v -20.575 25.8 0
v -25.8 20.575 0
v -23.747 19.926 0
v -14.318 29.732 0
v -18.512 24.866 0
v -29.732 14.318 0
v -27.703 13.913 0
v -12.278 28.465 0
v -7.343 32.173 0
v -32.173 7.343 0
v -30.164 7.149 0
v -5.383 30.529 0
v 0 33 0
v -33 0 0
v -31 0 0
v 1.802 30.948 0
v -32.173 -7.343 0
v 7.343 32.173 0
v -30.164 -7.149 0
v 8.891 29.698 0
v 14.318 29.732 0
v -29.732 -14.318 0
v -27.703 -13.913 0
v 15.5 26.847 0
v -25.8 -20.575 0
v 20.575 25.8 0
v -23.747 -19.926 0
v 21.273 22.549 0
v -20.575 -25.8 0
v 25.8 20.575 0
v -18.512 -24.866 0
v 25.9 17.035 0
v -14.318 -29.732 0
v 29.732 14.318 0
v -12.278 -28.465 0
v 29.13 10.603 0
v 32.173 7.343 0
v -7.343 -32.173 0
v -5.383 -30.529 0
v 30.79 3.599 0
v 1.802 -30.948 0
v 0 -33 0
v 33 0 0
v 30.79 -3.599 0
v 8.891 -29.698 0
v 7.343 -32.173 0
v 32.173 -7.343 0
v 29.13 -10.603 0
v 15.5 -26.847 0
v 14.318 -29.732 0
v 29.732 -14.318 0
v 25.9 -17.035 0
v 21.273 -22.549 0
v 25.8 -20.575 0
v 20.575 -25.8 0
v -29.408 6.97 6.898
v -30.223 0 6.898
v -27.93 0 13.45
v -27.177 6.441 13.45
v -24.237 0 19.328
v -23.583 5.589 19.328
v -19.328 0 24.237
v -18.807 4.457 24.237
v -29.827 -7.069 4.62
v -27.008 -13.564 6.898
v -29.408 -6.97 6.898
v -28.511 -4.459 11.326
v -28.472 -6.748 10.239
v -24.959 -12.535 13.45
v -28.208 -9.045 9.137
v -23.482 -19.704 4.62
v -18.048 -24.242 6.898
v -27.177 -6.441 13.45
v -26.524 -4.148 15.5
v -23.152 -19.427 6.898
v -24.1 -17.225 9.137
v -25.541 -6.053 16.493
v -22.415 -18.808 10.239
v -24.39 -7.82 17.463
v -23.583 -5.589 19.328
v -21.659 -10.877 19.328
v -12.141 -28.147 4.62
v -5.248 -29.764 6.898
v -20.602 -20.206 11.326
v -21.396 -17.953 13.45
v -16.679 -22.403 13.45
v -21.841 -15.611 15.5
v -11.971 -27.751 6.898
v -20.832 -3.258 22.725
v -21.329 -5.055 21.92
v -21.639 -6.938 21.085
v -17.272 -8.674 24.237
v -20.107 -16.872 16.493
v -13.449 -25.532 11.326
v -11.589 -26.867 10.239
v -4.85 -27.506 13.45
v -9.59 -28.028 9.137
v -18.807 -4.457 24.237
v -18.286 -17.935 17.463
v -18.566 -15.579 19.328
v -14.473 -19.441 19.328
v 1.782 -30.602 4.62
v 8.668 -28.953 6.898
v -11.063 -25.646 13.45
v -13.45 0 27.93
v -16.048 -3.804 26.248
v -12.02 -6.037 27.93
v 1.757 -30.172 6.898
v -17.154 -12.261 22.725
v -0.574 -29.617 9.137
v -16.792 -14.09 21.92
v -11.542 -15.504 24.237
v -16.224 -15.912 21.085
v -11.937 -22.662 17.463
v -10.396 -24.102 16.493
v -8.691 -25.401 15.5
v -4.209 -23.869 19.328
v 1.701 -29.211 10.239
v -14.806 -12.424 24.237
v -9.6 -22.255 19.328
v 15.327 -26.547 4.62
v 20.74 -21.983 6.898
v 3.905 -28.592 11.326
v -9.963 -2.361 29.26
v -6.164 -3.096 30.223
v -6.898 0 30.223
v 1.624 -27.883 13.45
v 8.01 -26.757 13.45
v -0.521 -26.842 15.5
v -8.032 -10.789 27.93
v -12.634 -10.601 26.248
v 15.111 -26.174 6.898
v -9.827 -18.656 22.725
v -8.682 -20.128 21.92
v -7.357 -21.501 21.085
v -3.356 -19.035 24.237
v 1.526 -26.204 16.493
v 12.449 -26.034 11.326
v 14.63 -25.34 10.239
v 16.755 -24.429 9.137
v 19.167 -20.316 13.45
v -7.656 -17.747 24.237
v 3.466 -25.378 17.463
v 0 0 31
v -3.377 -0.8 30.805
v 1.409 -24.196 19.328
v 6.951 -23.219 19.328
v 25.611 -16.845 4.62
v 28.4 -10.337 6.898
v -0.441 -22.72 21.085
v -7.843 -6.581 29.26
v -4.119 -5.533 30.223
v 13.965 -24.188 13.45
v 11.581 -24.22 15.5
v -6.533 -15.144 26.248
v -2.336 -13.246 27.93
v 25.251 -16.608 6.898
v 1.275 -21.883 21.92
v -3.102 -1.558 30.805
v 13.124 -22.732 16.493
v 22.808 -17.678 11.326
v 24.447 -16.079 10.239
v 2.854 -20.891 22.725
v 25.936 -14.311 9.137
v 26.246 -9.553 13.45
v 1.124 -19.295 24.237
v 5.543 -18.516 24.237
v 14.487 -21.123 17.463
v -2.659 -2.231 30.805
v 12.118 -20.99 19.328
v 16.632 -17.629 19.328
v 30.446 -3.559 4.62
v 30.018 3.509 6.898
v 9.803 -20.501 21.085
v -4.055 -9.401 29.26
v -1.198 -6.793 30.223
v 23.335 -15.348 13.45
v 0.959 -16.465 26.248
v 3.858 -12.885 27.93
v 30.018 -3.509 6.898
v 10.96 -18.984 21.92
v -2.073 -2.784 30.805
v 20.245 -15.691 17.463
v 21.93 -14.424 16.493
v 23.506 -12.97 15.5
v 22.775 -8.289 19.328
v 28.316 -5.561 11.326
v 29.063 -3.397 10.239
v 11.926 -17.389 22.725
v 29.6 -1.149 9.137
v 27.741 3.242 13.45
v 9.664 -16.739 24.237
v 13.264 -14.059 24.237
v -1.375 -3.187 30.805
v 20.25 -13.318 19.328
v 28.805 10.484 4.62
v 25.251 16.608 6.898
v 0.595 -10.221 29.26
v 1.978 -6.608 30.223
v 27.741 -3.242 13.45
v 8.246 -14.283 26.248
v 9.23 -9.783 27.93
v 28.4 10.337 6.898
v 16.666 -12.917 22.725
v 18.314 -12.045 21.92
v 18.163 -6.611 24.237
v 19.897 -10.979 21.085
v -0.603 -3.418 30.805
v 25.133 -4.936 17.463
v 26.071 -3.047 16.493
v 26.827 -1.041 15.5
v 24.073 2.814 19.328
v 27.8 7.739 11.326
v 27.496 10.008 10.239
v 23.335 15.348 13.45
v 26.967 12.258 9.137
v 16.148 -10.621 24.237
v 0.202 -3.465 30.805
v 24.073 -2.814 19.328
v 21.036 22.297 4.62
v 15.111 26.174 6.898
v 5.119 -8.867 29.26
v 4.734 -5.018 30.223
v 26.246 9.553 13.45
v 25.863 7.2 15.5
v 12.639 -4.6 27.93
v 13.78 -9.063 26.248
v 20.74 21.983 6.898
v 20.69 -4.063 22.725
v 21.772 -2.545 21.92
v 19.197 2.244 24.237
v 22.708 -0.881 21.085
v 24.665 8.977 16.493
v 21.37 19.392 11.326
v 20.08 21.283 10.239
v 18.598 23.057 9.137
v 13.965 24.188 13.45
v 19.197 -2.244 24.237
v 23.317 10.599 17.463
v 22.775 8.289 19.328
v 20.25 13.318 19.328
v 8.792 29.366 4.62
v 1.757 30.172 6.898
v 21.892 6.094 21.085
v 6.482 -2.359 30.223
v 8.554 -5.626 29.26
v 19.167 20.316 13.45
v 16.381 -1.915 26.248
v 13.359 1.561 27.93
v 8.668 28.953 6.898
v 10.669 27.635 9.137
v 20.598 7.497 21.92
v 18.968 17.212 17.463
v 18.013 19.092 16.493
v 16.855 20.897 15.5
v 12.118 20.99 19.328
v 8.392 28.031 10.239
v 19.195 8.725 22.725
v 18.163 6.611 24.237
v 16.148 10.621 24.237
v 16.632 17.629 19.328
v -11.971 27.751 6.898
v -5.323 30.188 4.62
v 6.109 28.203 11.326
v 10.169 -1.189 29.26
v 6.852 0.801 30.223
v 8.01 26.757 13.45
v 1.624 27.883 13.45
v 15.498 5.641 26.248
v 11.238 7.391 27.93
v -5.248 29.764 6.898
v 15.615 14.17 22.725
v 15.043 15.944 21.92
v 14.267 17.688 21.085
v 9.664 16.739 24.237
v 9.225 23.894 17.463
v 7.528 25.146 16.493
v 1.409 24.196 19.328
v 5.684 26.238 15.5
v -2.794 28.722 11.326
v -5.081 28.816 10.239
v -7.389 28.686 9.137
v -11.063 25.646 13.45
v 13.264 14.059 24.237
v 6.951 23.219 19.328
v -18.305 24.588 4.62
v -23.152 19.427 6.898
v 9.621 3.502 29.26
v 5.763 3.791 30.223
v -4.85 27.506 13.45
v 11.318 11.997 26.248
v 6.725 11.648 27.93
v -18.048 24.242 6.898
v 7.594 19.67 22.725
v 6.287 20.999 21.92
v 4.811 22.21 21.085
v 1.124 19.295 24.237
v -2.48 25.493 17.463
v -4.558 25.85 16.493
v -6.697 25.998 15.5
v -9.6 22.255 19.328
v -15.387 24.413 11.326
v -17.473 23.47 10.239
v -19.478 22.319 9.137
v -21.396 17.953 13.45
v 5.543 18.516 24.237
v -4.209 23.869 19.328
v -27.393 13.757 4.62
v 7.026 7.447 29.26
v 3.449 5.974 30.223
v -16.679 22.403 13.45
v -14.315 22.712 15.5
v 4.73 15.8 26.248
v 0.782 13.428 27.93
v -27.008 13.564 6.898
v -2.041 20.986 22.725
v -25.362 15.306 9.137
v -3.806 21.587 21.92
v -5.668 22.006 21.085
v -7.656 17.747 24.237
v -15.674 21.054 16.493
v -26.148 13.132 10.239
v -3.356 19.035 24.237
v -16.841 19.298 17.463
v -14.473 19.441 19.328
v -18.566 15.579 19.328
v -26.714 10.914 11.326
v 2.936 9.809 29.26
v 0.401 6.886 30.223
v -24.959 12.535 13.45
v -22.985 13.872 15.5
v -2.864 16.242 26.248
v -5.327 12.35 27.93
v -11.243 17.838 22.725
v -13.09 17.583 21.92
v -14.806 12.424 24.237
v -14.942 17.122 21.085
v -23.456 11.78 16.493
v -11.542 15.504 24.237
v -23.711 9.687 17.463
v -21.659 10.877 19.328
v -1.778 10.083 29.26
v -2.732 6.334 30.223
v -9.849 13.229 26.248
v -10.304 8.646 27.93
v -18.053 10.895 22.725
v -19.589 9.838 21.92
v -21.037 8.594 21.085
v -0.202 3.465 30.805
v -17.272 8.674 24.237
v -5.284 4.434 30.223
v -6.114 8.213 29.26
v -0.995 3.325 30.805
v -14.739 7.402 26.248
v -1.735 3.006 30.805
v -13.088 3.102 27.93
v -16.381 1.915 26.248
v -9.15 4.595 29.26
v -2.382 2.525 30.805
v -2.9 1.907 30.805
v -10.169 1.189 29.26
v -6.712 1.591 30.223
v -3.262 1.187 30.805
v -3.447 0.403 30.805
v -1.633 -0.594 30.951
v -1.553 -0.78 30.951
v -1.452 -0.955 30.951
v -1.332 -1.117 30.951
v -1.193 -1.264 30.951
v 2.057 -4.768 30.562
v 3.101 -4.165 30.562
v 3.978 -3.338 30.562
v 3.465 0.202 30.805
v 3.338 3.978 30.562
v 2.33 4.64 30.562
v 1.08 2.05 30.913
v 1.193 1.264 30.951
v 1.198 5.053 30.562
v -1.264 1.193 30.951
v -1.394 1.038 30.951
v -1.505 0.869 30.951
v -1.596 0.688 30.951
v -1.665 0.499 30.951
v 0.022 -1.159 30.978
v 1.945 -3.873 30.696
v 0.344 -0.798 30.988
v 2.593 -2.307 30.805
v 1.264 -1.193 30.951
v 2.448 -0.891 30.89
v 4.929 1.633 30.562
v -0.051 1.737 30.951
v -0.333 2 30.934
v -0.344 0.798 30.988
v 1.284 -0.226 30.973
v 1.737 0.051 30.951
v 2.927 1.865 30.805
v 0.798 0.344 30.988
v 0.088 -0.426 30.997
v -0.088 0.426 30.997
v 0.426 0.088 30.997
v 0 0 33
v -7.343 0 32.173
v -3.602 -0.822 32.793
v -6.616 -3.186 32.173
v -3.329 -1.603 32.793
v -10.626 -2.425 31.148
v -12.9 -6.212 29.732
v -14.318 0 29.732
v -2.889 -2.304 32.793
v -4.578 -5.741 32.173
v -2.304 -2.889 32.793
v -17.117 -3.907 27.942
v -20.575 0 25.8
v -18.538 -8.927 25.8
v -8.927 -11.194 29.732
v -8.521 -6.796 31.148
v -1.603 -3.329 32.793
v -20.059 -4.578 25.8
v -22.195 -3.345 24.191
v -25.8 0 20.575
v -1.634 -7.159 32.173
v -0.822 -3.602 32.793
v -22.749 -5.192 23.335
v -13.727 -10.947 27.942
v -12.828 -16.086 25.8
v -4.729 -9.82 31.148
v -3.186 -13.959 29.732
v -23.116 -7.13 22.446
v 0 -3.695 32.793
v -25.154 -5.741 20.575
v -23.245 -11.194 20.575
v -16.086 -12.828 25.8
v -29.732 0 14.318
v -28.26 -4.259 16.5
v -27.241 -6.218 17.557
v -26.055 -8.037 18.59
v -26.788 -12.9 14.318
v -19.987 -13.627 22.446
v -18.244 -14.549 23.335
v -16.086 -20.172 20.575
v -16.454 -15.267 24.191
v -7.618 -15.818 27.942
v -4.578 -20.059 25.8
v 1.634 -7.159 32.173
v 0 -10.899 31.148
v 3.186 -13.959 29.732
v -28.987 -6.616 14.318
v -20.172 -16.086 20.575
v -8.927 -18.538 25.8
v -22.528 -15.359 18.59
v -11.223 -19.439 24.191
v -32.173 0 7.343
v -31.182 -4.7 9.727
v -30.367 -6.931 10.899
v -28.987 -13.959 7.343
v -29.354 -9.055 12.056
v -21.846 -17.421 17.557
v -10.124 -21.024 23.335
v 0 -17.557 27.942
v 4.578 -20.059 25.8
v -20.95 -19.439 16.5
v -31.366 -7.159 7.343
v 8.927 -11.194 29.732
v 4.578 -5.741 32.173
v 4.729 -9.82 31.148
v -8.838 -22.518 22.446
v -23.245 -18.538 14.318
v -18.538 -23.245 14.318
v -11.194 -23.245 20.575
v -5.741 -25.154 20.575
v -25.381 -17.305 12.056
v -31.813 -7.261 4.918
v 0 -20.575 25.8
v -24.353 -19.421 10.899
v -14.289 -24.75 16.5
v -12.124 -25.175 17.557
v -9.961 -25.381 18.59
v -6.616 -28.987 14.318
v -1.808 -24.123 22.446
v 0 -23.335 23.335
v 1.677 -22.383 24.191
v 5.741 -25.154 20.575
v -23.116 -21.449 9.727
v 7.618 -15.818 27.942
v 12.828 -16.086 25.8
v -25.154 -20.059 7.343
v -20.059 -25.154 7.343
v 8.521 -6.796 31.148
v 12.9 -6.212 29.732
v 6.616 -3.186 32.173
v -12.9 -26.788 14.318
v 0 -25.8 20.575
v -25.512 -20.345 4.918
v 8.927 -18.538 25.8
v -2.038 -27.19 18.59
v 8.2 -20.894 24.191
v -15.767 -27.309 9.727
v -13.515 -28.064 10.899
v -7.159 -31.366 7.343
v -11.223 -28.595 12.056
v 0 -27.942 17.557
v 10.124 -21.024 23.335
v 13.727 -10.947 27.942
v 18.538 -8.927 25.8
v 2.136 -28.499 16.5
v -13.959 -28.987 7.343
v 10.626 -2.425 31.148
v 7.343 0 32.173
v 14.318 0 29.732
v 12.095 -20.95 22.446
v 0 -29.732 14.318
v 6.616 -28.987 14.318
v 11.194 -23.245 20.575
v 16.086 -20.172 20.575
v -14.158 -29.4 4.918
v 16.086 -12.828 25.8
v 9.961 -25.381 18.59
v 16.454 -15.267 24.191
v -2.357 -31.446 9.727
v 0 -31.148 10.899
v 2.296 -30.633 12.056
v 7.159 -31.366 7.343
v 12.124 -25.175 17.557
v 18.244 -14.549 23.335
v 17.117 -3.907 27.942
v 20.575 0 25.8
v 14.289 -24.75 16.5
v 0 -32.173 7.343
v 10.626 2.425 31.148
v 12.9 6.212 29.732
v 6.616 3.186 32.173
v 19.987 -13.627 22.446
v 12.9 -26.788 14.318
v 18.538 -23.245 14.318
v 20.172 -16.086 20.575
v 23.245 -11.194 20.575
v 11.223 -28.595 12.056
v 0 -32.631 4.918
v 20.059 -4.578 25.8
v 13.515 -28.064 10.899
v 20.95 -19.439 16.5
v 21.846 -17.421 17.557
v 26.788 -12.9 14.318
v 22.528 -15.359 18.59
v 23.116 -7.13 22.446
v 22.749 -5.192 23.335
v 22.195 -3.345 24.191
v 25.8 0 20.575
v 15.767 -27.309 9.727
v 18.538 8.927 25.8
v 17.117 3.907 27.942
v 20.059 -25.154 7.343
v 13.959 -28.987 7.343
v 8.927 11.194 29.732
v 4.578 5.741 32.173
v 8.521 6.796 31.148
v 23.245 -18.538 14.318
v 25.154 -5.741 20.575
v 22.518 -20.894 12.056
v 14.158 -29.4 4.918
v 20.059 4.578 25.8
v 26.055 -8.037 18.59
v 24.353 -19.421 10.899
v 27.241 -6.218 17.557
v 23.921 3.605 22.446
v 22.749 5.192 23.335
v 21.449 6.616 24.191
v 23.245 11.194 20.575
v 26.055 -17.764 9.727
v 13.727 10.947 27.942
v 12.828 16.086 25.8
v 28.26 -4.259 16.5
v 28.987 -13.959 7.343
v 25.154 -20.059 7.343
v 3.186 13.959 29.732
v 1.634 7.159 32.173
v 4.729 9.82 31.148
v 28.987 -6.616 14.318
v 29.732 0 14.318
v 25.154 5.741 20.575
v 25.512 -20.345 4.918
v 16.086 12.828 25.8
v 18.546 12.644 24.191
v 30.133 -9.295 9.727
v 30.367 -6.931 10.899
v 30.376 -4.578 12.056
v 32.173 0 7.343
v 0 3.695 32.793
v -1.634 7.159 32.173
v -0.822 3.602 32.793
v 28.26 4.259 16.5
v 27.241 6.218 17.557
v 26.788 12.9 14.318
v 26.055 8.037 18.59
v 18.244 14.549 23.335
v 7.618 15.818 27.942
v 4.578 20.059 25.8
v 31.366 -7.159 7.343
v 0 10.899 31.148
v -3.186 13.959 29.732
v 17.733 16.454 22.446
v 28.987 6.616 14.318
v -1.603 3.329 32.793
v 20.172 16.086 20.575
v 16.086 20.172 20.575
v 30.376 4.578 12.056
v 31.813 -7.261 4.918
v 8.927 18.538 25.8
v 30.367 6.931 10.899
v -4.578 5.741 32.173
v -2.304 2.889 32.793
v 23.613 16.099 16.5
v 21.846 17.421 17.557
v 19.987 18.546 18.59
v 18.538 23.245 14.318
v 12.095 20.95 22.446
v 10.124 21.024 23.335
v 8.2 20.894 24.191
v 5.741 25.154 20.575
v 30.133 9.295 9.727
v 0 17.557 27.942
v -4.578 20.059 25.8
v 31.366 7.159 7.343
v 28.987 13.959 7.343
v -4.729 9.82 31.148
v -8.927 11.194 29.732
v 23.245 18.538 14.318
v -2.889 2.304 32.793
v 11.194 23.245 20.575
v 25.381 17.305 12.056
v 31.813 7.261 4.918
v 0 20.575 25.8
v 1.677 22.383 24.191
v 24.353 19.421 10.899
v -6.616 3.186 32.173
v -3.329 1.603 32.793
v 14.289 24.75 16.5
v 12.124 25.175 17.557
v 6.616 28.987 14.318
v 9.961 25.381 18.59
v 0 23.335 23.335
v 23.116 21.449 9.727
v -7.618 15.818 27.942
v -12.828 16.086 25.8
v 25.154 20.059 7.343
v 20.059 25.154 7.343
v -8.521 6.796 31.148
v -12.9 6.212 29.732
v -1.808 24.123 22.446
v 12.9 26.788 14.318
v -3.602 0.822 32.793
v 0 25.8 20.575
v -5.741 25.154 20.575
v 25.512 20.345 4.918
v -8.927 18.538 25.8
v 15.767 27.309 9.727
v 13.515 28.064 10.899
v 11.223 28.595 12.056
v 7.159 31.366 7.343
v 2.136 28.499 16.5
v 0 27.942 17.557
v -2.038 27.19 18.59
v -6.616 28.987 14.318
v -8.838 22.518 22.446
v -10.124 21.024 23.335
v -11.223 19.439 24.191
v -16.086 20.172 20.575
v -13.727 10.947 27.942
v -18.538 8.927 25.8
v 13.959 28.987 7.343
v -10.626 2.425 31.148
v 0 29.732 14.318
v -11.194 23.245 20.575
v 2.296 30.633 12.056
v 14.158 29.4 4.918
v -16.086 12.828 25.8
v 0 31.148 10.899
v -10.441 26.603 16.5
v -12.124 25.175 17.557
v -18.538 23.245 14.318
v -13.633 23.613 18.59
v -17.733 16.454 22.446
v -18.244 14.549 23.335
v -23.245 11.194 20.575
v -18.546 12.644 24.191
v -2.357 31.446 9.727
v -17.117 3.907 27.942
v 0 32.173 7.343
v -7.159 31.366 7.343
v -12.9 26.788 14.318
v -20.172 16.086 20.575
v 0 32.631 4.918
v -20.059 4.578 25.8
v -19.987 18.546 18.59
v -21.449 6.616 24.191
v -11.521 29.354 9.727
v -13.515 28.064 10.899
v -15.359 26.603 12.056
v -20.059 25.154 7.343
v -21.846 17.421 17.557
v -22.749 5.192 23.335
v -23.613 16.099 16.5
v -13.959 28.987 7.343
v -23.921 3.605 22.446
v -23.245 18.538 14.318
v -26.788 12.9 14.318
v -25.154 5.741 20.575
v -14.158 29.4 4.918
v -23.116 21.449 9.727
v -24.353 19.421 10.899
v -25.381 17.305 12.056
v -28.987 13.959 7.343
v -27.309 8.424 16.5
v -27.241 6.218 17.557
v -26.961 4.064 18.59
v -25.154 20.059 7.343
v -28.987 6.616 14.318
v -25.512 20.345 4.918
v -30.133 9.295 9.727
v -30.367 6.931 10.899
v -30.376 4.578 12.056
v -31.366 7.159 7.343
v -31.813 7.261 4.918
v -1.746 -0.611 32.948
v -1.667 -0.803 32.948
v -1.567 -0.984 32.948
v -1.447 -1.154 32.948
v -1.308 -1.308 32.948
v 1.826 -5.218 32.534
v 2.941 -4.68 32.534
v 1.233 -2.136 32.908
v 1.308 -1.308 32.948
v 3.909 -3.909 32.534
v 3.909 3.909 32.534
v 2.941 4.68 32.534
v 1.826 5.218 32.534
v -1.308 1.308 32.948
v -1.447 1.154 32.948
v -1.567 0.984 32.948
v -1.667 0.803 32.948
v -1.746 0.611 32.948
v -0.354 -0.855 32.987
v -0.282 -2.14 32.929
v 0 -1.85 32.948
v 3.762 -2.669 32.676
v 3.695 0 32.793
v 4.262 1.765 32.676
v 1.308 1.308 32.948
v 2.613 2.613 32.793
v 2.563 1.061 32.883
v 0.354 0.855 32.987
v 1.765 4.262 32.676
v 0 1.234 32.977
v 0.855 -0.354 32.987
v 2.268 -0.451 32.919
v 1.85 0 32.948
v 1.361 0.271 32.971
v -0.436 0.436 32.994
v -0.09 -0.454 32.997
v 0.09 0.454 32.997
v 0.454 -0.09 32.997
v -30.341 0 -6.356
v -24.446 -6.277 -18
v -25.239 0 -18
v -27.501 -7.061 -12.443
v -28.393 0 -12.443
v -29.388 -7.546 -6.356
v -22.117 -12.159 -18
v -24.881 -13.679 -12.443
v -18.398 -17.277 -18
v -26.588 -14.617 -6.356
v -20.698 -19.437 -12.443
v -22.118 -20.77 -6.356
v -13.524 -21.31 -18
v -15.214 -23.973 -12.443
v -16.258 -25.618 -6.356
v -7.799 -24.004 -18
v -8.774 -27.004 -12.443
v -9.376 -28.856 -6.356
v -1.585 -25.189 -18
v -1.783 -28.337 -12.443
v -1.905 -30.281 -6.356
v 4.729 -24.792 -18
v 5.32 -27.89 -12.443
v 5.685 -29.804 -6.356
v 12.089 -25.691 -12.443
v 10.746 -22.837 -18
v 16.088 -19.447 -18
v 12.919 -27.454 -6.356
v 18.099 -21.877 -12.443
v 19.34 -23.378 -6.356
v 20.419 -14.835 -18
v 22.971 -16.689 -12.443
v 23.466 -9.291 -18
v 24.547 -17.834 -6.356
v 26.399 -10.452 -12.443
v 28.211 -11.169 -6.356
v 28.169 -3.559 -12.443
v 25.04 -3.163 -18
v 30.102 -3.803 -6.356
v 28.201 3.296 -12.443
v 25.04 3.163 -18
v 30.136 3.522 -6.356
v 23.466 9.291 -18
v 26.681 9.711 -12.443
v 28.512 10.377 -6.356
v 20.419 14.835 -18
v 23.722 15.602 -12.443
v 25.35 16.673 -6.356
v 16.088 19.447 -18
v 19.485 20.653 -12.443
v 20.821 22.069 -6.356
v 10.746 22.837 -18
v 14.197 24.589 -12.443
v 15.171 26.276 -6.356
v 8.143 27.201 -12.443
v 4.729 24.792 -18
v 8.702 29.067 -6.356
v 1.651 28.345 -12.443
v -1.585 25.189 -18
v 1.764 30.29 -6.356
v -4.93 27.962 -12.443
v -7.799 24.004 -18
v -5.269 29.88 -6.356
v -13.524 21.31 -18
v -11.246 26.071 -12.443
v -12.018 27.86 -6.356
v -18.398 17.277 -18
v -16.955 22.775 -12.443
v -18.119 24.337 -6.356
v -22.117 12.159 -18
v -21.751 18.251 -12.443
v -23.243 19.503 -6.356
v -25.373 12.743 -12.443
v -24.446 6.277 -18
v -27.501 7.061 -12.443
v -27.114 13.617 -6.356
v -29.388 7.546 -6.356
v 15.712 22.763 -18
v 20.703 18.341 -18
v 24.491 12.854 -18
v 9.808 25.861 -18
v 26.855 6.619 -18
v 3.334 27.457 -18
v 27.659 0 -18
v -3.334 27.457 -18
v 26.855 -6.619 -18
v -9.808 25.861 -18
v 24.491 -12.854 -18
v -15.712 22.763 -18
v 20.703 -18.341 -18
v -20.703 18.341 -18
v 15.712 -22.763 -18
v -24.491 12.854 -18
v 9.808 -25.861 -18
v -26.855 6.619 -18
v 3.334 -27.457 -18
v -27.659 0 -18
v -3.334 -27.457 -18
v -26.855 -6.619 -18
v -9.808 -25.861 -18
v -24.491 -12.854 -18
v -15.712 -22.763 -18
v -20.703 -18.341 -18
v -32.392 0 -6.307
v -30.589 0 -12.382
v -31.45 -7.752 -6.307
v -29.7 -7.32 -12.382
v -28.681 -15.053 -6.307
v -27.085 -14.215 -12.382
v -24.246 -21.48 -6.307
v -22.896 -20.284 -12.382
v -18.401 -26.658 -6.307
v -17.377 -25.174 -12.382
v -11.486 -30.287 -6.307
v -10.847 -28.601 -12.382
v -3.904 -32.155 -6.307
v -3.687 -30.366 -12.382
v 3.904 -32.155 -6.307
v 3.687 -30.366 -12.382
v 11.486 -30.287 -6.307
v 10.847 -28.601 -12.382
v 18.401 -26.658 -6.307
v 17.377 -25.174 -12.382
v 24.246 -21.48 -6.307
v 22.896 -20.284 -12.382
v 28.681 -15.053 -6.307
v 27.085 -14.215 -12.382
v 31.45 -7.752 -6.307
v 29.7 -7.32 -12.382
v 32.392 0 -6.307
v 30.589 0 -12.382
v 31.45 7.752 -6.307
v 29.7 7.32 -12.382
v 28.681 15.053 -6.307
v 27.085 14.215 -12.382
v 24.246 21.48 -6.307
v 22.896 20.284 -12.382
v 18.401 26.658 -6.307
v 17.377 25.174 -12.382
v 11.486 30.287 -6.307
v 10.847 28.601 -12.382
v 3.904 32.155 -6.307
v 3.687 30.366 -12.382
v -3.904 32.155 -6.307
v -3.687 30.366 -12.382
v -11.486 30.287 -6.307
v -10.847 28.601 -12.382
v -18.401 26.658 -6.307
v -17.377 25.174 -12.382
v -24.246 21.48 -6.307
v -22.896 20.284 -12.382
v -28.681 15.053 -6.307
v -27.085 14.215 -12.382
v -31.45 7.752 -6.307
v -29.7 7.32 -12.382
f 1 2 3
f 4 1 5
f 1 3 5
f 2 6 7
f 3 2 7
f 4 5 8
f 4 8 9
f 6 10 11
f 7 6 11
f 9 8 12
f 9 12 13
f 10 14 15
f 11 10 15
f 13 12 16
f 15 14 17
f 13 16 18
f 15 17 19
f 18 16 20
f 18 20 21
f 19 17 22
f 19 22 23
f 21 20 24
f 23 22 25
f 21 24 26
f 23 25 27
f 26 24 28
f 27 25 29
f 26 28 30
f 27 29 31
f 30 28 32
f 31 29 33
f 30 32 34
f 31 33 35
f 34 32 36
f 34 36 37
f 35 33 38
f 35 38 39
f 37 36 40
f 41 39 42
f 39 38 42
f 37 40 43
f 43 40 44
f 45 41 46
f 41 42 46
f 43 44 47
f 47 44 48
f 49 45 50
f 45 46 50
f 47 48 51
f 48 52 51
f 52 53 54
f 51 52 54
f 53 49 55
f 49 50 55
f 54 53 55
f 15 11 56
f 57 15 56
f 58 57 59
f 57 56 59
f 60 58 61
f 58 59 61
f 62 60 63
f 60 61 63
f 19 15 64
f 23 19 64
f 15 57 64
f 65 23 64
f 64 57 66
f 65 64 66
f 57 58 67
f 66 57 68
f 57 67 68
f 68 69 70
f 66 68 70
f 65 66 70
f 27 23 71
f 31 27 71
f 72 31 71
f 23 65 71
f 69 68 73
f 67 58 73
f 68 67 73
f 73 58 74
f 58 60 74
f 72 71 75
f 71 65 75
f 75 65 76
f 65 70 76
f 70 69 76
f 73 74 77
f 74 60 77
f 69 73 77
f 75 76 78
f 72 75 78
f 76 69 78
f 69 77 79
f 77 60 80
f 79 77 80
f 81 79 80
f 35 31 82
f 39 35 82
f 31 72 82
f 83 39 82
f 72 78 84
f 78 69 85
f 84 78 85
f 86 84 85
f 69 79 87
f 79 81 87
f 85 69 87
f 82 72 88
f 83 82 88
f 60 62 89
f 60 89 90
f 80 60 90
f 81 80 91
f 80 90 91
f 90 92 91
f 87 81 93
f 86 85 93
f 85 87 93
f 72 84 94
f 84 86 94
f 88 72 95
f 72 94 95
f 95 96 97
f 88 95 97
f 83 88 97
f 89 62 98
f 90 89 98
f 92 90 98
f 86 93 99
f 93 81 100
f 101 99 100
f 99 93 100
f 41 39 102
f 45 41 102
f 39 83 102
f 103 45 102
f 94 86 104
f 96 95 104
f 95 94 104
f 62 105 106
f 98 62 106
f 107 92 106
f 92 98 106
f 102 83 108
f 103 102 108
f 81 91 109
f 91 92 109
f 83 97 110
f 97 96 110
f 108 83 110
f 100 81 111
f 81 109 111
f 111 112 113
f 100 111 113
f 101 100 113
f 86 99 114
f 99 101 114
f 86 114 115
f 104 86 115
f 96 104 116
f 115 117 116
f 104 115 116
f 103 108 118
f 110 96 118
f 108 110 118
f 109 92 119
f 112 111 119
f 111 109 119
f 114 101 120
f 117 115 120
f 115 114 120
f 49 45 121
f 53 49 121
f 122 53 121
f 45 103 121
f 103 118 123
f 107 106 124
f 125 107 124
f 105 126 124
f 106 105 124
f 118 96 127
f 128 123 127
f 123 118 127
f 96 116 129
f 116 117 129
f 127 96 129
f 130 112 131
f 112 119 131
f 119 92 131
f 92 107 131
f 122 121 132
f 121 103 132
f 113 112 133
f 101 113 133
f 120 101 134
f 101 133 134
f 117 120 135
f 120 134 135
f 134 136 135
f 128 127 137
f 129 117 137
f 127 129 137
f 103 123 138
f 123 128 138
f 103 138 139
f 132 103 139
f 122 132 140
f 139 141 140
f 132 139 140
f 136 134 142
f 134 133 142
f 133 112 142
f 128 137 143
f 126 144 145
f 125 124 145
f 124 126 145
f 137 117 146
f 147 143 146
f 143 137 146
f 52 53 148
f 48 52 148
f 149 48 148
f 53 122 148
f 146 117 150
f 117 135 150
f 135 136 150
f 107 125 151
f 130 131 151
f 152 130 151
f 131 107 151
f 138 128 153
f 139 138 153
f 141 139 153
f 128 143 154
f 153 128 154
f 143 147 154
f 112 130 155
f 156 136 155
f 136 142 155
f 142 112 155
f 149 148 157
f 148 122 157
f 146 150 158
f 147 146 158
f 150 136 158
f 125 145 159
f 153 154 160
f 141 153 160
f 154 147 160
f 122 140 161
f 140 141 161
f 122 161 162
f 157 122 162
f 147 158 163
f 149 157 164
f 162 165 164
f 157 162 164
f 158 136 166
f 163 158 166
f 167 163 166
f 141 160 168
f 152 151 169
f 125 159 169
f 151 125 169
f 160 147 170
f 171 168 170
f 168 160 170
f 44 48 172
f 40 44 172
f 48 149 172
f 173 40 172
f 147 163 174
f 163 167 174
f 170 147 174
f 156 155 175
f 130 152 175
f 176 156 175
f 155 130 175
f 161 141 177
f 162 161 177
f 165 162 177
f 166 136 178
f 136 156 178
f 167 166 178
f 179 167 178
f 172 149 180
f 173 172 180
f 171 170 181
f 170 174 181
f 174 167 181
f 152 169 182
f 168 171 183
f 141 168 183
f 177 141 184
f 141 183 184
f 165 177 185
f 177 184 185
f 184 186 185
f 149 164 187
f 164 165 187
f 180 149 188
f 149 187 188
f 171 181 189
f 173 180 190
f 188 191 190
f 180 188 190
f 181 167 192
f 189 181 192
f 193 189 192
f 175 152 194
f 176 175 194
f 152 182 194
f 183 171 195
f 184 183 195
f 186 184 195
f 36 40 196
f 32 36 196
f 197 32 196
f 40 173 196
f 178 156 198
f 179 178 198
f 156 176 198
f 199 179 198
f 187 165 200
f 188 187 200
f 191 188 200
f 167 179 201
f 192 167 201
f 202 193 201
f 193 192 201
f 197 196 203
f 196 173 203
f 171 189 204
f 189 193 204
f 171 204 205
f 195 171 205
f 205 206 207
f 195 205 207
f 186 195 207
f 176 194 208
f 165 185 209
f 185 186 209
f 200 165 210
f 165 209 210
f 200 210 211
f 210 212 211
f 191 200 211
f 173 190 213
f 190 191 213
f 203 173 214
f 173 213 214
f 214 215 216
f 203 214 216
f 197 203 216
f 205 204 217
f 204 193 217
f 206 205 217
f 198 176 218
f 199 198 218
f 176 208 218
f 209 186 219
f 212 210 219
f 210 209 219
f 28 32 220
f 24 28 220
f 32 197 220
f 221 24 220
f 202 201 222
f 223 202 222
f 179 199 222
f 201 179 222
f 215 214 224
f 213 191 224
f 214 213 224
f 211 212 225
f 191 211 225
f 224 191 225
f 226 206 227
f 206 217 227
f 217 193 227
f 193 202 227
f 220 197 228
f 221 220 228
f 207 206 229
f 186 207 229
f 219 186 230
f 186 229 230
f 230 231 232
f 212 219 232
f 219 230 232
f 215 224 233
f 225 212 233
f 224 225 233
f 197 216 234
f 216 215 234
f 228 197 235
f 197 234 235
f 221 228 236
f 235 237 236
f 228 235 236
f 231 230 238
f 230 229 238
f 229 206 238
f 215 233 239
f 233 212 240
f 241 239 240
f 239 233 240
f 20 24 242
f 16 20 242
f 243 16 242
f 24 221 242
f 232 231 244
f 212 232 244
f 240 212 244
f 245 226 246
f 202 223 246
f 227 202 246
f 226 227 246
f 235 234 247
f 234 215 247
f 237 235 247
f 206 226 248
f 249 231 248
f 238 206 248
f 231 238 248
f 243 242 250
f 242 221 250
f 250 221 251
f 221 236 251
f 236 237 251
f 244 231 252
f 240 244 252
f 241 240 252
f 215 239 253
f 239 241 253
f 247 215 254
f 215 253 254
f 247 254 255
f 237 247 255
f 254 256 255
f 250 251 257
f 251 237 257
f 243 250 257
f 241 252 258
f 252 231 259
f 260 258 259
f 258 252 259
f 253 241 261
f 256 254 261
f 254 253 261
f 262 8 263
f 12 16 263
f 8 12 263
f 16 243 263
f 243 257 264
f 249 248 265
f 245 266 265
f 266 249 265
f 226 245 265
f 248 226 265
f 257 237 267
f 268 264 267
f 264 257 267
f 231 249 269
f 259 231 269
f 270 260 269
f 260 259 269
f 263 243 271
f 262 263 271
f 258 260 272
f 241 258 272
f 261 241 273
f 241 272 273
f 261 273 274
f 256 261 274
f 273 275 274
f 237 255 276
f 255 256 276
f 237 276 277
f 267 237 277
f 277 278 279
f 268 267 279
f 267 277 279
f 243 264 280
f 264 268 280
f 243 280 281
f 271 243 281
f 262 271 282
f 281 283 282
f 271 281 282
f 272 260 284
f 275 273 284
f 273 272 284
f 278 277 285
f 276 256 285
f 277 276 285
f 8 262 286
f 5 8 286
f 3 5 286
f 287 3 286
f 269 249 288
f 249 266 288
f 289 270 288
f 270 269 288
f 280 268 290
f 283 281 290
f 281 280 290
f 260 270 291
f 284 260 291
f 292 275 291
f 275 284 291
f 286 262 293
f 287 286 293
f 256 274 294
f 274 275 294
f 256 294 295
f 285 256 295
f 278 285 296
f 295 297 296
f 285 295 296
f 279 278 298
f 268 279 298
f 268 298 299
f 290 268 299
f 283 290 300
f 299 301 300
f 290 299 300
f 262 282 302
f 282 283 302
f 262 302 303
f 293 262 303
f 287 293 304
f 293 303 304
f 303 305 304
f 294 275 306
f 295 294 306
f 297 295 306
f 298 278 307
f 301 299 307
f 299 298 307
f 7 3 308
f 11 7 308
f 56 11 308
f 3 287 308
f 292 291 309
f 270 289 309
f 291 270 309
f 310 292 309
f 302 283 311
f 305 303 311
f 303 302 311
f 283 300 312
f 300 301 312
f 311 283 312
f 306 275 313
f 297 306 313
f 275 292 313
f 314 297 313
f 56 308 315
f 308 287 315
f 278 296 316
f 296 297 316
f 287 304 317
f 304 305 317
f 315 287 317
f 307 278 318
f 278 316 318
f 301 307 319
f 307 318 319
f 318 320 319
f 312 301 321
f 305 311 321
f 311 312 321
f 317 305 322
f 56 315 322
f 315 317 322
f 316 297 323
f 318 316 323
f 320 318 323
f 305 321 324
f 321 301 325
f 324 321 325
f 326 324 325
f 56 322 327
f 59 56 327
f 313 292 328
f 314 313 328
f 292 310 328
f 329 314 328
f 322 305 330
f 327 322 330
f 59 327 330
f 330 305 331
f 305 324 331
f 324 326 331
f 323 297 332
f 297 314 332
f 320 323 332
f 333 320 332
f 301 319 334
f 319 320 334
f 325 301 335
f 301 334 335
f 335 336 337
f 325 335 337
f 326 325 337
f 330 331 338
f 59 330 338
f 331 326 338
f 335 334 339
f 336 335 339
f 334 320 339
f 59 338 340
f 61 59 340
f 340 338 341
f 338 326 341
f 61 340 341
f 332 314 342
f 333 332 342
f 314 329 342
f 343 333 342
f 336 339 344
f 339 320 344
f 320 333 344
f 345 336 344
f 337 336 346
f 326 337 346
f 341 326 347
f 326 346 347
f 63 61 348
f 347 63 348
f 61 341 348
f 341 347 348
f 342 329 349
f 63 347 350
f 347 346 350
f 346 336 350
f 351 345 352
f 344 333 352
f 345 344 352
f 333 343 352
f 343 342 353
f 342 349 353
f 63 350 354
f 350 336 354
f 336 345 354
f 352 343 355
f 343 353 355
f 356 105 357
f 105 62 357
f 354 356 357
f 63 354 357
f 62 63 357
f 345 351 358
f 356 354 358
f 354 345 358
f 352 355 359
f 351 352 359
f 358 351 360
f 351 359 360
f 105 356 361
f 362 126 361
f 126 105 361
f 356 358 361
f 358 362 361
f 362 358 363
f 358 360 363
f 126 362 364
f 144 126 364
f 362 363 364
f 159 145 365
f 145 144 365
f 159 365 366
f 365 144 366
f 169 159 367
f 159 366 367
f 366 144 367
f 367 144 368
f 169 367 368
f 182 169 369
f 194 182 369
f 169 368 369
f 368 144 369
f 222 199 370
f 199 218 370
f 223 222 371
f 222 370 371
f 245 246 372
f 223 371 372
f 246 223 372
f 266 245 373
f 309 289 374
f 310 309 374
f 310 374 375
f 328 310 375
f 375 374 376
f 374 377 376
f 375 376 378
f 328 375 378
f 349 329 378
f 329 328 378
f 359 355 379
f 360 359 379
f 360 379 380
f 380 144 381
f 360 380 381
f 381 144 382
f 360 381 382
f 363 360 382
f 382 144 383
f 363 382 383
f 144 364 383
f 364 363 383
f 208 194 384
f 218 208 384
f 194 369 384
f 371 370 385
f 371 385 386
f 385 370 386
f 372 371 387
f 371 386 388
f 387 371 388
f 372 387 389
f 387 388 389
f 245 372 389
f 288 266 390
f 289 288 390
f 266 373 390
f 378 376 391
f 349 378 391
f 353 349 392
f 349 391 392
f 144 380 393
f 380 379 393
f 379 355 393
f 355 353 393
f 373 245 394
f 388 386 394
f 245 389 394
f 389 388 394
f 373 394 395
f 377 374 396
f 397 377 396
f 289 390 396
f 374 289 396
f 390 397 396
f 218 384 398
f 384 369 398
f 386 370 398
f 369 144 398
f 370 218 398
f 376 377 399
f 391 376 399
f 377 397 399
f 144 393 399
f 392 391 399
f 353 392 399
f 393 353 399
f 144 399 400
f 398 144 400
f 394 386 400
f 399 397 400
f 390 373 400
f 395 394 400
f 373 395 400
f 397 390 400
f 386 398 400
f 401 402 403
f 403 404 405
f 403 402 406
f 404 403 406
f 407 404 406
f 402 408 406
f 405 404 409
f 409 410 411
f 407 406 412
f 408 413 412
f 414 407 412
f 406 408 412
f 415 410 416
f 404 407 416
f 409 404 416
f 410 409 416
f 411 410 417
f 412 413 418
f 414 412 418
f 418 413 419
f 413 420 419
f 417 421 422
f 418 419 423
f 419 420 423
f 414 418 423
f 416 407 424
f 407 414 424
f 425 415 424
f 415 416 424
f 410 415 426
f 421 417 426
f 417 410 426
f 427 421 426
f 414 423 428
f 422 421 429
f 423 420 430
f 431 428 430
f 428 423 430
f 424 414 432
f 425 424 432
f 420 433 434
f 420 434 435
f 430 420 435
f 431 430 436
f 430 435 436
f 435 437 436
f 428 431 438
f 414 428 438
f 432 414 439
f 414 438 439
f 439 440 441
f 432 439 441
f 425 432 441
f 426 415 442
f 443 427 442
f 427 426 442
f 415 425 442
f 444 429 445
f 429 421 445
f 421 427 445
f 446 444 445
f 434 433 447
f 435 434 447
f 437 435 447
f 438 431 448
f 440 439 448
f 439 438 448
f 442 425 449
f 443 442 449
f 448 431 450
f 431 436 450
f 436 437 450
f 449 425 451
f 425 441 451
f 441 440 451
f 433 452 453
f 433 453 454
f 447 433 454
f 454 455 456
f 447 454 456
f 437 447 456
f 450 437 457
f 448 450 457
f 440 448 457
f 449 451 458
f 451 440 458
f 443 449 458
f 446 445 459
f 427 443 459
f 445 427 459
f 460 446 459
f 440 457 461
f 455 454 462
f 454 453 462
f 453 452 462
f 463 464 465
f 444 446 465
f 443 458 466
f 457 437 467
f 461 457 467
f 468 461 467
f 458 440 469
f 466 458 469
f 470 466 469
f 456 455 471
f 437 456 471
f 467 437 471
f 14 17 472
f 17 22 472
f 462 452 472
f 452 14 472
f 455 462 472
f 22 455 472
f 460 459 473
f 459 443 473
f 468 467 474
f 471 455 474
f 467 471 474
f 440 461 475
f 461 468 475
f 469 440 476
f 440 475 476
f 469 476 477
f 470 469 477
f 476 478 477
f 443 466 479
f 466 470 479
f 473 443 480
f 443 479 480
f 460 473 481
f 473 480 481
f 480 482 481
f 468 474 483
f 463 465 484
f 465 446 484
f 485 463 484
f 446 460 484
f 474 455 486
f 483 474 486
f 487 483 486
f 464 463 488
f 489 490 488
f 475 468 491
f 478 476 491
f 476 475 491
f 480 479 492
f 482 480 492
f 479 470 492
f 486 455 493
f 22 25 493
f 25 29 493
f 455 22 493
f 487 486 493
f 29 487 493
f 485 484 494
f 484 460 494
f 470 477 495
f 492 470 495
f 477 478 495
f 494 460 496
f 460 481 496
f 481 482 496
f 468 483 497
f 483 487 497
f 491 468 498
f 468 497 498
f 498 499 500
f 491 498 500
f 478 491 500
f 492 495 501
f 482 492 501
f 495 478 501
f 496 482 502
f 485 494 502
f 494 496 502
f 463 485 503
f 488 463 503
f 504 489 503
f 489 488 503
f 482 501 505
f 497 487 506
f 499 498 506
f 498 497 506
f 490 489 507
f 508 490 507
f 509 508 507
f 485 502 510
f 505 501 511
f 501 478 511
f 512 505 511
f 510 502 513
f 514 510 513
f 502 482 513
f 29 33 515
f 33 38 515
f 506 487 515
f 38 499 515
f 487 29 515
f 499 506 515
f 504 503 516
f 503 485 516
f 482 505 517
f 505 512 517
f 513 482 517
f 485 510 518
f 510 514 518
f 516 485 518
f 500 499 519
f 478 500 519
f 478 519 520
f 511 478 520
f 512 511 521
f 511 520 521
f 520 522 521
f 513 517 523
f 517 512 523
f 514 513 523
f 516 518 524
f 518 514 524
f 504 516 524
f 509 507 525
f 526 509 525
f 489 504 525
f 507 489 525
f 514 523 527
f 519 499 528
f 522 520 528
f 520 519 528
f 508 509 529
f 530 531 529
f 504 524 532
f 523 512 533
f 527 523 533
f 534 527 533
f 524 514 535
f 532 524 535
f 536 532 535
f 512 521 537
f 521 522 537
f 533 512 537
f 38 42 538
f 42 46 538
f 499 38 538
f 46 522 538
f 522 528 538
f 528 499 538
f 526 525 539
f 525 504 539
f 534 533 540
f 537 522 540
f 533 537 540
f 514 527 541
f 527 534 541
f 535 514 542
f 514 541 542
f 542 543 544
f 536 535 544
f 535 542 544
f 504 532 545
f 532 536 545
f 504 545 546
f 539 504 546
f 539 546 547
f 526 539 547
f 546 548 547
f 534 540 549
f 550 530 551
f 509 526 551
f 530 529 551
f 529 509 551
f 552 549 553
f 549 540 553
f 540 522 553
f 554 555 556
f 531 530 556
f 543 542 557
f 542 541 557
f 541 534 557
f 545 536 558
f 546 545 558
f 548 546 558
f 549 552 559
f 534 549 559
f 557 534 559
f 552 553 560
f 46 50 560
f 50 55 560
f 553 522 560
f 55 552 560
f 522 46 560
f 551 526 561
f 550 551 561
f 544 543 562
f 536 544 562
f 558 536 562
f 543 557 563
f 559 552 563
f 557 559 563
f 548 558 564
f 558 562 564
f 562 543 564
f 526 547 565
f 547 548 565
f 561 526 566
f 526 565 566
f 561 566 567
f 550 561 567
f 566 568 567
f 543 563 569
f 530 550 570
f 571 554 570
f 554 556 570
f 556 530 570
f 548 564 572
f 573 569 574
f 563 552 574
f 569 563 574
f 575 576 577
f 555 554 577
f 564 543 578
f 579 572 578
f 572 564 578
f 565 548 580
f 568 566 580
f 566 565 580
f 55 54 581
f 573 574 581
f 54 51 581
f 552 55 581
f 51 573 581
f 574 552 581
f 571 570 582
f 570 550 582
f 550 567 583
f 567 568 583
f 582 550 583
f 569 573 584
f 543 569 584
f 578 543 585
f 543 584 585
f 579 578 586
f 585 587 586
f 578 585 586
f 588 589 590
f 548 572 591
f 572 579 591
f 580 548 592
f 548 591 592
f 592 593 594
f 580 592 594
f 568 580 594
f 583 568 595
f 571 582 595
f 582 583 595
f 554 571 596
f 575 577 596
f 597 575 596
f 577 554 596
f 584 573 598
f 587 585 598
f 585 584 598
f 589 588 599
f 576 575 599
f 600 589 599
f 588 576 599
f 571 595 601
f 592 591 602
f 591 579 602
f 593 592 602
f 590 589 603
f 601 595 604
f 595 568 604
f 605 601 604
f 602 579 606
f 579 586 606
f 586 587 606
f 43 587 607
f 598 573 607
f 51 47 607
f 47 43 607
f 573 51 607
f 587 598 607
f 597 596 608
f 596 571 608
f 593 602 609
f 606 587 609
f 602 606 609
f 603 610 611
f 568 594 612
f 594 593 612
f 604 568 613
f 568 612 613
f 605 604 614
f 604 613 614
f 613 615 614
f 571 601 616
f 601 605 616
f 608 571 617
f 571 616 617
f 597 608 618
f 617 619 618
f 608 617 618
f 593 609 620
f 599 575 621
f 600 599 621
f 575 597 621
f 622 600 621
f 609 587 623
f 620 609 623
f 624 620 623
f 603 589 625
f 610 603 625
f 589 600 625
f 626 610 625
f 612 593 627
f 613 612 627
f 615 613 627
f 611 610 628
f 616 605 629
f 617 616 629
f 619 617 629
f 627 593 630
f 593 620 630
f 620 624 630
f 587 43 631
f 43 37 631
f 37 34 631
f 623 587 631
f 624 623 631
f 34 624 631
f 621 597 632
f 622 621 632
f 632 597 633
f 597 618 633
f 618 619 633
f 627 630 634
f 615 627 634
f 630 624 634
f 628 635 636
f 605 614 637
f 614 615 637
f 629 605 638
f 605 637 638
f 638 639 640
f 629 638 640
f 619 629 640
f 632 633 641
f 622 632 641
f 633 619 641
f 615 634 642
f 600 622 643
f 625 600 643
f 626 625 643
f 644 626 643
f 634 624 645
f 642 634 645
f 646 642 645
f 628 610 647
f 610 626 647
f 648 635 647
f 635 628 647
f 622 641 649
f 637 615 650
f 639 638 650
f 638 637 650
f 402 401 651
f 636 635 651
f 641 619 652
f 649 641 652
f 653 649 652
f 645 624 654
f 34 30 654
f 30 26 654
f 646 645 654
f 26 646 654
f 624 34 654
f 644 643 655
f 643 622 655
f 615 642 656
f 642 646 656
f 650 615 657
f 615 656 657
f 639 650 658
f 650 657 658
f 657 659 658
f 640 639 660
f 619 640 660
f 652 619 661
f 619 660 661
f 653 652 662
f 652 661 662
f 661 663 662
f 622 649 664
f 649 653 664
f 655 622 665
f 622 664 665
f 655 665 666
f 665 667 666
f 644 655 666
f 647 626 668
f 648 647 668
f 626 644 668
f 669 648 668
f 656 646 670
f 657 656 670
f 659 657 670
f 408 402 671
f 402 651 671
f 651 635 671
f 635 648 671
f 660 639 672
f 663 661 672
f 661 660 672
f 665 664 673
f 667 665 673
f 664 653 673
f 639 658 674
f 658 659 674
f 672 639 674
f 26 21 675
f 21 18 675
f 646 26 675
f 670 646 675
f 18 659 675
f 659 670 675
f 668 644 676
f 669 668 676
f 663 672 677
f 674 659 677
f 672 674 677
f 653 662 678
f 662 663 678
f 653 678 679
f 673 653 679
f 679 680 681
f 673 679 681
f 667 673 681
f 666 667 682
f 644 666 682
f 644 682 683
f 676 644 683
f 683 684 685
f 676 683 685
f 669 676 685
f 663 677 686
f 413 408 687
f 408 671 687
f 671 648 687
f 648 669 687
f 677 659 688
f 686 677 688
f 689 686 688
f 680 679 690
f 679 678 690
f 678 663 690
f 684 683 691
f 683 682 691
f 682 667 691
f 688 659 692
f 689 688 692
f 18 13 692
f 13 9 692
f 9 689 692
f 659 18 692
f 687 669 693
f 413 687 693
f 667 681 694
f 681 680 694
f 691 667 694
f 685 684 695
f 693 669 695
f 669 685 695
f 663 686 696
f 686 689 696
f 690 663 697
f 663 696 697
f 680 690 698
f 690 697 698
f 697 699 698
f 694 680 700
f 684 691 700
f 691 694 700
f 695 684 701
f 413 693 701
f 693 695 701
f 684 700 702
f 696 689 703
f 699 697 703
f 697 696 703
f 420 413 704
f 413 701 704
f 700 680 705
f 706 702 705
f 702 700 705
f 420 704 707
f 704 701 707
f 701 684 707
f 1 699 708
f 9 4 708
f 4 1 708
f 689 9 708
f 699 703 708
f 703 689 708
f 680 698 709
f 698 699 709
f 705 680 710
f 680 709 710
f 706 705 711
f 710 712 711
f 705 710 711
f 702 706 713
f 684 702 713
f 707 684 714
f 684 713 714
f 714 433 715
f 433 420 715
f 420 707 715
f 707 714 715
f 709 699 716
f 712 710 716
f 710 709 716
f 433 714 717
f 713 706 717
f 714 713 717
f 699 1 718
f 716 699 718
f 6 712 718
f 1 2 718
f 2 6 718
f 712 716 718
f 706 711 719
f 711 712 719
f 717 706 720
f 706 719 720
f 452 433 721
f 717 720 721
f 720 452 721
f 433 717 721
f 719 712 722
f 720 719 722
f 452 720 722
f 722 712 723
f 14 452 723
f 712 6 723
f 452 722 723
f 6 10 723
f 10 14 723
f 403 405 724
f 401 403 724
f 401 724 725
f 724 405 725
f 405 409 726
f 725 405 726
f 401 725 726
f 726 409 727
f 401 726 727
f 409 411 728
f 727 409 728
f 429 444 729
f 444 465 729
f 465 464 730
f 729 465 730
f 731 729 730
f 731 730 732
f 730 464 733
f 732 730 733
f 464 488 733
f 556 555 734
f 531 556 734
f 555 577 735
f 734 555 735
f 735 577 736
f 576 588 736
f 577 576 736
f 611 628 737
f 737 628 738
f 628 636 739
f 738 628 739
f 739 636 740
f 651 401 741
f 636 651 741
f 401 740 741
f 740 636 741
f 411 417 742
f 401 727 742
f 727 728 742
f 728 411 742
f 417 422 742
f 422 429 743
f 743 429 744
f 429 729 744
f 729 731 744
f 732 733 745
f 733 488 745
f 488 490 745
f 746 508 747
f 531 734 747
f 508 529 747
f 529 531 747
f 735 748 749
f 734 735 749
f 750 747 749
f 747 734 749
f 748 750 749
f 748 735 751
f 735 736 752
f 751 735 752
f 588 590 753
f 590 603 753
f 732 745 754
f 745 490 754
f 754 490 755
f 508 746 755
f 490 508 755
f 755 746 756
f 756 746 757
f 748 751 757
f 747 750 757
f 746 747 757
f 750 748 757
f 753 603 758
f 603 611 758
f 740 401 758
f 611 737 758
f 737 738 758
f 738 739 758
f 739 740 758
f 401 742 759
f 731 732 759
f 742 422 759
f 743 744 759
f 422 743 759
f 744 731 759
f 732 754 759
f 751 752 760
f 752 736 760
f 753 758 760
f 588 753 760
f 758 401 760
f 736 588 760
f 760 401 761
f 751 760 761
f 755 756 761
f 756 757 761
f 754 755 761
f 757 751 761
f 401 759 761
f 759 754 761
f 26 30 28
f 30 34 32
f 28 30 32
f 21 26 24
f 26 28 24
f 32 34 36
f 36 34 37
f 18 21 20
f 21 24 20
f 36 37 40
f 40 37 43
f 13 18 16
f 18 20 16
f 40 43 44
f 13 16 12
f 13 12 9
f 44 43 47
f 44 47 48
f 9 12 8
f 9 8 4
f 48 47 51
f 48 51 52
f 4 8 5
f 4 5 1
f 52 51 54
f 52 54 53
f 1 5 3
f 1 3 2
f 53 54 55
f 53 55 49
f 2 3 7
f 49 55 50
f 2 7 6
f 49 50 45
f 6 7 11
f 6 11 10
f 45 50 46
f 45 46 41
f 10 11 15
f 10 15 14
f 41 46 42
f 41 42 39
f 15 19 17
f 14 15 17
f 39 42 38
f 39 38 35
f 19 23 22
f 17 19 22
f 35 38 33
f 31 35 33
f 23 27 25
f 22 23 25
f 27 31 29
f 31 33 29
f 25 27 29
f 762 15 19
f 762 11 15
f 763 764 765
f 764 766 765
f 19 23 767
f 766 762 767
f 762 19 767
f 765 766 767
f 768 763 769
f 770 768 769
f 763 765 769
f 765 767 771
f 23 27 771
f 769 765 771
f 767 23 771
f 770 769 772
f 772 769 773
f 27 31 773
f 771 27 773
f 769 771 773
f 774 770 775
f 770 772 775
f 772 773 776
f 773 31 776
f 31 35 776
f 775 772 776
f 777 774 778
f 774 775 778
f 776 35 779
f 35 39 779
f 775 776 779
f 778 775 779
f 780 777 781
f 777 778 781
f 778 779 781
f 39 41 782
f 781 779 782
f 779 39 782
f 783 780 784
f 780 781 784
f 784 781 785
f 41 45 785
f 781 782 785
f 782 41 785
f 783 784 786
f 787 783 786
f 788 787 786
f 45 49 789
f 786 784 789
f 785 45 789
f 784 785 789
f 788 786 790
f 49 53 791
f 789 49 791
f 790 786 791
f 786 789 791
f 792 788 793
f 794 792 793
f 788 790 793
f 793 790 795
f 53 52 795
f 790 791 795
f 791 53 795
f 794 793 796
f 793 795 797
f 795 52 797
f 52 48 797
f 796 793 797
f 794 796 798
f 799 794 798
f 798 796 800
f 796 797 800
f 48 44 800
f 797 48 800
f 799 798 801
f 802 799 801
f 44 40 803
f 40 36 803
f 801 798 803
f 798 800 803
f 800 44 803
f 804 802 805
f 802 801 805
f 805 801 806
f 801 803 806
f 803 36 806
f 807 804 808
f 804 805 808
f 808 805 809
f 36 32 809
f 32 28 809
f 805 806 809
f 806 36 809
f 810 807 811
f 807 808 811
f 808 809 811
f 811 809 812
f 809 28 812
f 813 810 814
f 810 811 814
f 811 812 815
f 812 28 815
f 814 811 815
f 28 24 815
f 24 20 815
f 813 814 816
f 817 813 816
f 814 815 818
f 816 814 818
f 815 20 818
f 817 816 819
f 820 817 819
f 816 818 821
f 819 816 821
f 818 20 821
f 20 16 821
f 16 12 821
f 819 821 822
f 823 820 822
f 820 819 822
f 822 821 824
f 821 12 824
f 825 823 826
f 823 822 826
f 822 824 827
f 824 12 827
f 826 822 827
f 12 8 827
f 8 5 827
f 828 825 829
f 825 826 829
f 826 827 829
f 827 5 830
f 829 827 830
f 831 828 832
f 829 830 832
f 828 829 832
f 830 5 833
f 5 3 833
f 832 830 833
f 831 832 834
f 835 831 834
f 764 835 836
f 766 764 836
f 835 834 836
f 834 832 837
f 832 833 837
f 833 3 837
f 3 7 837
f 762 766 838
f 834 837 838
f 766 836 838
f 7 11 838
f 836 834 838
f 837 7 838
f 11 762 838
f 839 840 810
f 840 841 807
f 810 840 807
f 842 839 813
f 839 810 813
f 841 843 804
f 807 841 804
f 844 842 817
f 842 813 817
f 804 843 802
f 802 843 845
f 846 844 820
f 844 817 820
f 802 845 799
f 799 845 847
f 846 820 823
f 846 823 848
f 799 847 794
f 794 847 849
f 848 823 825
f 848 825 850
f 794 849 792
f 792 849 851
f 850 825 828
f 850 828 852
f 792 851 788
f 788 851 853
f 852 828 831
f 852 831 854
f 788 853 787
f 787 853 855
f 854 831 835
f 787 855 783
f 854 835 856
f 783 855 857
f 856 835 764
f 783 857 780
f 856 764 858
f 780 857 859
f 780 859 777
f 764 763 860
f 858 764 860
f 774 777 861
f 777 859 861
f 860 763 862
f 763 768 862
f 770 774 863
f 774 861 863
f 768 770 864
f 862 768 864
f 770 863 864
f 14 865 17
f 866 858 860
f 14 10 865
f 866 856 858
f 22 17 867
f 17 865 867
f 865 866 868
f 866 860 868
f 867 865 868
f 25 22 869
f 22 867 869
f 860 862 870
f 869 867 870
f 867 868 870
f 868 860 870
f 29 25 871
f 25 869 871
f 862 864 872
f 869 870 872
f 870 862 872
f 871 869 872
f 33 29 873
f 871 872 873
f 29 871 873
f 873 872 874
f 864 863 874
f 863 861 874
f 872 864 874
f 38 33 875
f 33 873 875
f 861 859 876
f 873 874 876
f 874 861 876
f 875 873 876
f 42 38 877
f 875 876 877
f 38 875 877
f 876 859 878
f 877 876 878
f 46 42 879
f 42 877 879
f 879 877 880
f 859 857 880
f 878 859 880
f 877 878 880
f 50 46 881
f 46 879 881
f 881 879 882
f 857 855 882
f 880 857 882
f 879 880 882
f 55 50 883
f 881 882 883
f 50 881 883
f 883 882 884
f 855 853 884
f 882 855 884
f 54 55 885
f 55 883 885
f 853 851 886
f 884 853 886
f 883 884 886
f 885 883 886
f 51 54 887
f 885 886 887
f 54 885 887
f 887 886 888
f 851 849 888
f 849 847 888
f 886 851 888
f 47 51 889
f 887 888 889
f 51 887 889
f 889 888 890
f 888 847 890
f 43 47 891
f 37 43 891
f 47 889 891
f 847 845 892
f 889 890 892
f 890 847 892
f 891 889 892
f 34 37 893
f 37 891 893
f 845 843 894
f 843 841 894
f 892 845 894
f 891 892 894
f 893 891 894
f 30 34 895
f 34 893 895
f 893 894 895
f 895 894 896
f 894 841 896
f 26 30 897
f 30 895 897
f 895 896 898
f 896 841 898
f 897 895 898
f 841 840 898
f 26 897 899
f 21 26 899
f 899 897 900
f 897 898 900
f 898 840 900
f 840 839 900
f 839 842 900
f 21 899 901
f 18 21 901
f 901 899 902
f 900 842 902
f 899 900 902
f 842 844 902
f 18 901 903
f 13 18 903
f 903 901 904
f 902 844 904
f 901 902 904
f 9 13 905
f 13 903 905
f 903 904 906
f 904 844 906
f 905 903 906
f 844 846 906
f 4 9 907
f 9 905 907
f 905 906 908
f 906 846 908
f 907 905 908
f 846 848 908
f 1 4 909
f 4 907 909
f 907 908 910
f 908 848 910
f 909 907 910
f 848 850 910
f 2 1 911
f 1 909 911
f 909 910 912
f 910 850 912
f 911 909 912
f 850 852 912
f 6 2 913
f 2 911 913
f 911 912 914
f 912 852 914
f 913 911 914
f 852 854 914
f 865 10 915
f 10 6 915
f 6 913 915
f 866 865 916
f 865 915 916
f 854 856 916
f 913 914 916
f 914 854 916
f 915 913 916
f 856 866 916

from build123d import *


with BuildPart() as f1:
    # F0 (on Front) → F1 (revolve)
    with BuildSketch(Plane.XZ):
        with BuildLine():
            Line((0, 31), (0, 33))
            ThreePointArc((0, 33), (-23.334524, 23.334524), (-33, 0))
            Line((-33, 0), (-31, 0))
            ThreePointArc((-31, 0), (-21.92031, 21.92031), (0, 31))
        make_face()
    revolve(axis=Axis((0, 0, 25.157485), (0, 0, 1)))


with BuildPart() as f3:
    # F2 (on Front) → F3 (revolve)
    with BuildSketch(Plane.XZ):
        with BuildLine():
            Line((-31, 0), (-33, 0))
            ThreePointArc((-33, 0), (-31.636489, -9.387894), (-27.658633, -18))
            Line((-27.658633, -18), (-25.238859, -18))
            ThreePointArc((-25.238859, -18), (-29.524605, -9.449745), (-31, 0))
        make_face()
    revolve(axis=Axis((0, 0, 25.157485), (0, 0, 1)))


solid = Compound([f1.part, f3.part])
